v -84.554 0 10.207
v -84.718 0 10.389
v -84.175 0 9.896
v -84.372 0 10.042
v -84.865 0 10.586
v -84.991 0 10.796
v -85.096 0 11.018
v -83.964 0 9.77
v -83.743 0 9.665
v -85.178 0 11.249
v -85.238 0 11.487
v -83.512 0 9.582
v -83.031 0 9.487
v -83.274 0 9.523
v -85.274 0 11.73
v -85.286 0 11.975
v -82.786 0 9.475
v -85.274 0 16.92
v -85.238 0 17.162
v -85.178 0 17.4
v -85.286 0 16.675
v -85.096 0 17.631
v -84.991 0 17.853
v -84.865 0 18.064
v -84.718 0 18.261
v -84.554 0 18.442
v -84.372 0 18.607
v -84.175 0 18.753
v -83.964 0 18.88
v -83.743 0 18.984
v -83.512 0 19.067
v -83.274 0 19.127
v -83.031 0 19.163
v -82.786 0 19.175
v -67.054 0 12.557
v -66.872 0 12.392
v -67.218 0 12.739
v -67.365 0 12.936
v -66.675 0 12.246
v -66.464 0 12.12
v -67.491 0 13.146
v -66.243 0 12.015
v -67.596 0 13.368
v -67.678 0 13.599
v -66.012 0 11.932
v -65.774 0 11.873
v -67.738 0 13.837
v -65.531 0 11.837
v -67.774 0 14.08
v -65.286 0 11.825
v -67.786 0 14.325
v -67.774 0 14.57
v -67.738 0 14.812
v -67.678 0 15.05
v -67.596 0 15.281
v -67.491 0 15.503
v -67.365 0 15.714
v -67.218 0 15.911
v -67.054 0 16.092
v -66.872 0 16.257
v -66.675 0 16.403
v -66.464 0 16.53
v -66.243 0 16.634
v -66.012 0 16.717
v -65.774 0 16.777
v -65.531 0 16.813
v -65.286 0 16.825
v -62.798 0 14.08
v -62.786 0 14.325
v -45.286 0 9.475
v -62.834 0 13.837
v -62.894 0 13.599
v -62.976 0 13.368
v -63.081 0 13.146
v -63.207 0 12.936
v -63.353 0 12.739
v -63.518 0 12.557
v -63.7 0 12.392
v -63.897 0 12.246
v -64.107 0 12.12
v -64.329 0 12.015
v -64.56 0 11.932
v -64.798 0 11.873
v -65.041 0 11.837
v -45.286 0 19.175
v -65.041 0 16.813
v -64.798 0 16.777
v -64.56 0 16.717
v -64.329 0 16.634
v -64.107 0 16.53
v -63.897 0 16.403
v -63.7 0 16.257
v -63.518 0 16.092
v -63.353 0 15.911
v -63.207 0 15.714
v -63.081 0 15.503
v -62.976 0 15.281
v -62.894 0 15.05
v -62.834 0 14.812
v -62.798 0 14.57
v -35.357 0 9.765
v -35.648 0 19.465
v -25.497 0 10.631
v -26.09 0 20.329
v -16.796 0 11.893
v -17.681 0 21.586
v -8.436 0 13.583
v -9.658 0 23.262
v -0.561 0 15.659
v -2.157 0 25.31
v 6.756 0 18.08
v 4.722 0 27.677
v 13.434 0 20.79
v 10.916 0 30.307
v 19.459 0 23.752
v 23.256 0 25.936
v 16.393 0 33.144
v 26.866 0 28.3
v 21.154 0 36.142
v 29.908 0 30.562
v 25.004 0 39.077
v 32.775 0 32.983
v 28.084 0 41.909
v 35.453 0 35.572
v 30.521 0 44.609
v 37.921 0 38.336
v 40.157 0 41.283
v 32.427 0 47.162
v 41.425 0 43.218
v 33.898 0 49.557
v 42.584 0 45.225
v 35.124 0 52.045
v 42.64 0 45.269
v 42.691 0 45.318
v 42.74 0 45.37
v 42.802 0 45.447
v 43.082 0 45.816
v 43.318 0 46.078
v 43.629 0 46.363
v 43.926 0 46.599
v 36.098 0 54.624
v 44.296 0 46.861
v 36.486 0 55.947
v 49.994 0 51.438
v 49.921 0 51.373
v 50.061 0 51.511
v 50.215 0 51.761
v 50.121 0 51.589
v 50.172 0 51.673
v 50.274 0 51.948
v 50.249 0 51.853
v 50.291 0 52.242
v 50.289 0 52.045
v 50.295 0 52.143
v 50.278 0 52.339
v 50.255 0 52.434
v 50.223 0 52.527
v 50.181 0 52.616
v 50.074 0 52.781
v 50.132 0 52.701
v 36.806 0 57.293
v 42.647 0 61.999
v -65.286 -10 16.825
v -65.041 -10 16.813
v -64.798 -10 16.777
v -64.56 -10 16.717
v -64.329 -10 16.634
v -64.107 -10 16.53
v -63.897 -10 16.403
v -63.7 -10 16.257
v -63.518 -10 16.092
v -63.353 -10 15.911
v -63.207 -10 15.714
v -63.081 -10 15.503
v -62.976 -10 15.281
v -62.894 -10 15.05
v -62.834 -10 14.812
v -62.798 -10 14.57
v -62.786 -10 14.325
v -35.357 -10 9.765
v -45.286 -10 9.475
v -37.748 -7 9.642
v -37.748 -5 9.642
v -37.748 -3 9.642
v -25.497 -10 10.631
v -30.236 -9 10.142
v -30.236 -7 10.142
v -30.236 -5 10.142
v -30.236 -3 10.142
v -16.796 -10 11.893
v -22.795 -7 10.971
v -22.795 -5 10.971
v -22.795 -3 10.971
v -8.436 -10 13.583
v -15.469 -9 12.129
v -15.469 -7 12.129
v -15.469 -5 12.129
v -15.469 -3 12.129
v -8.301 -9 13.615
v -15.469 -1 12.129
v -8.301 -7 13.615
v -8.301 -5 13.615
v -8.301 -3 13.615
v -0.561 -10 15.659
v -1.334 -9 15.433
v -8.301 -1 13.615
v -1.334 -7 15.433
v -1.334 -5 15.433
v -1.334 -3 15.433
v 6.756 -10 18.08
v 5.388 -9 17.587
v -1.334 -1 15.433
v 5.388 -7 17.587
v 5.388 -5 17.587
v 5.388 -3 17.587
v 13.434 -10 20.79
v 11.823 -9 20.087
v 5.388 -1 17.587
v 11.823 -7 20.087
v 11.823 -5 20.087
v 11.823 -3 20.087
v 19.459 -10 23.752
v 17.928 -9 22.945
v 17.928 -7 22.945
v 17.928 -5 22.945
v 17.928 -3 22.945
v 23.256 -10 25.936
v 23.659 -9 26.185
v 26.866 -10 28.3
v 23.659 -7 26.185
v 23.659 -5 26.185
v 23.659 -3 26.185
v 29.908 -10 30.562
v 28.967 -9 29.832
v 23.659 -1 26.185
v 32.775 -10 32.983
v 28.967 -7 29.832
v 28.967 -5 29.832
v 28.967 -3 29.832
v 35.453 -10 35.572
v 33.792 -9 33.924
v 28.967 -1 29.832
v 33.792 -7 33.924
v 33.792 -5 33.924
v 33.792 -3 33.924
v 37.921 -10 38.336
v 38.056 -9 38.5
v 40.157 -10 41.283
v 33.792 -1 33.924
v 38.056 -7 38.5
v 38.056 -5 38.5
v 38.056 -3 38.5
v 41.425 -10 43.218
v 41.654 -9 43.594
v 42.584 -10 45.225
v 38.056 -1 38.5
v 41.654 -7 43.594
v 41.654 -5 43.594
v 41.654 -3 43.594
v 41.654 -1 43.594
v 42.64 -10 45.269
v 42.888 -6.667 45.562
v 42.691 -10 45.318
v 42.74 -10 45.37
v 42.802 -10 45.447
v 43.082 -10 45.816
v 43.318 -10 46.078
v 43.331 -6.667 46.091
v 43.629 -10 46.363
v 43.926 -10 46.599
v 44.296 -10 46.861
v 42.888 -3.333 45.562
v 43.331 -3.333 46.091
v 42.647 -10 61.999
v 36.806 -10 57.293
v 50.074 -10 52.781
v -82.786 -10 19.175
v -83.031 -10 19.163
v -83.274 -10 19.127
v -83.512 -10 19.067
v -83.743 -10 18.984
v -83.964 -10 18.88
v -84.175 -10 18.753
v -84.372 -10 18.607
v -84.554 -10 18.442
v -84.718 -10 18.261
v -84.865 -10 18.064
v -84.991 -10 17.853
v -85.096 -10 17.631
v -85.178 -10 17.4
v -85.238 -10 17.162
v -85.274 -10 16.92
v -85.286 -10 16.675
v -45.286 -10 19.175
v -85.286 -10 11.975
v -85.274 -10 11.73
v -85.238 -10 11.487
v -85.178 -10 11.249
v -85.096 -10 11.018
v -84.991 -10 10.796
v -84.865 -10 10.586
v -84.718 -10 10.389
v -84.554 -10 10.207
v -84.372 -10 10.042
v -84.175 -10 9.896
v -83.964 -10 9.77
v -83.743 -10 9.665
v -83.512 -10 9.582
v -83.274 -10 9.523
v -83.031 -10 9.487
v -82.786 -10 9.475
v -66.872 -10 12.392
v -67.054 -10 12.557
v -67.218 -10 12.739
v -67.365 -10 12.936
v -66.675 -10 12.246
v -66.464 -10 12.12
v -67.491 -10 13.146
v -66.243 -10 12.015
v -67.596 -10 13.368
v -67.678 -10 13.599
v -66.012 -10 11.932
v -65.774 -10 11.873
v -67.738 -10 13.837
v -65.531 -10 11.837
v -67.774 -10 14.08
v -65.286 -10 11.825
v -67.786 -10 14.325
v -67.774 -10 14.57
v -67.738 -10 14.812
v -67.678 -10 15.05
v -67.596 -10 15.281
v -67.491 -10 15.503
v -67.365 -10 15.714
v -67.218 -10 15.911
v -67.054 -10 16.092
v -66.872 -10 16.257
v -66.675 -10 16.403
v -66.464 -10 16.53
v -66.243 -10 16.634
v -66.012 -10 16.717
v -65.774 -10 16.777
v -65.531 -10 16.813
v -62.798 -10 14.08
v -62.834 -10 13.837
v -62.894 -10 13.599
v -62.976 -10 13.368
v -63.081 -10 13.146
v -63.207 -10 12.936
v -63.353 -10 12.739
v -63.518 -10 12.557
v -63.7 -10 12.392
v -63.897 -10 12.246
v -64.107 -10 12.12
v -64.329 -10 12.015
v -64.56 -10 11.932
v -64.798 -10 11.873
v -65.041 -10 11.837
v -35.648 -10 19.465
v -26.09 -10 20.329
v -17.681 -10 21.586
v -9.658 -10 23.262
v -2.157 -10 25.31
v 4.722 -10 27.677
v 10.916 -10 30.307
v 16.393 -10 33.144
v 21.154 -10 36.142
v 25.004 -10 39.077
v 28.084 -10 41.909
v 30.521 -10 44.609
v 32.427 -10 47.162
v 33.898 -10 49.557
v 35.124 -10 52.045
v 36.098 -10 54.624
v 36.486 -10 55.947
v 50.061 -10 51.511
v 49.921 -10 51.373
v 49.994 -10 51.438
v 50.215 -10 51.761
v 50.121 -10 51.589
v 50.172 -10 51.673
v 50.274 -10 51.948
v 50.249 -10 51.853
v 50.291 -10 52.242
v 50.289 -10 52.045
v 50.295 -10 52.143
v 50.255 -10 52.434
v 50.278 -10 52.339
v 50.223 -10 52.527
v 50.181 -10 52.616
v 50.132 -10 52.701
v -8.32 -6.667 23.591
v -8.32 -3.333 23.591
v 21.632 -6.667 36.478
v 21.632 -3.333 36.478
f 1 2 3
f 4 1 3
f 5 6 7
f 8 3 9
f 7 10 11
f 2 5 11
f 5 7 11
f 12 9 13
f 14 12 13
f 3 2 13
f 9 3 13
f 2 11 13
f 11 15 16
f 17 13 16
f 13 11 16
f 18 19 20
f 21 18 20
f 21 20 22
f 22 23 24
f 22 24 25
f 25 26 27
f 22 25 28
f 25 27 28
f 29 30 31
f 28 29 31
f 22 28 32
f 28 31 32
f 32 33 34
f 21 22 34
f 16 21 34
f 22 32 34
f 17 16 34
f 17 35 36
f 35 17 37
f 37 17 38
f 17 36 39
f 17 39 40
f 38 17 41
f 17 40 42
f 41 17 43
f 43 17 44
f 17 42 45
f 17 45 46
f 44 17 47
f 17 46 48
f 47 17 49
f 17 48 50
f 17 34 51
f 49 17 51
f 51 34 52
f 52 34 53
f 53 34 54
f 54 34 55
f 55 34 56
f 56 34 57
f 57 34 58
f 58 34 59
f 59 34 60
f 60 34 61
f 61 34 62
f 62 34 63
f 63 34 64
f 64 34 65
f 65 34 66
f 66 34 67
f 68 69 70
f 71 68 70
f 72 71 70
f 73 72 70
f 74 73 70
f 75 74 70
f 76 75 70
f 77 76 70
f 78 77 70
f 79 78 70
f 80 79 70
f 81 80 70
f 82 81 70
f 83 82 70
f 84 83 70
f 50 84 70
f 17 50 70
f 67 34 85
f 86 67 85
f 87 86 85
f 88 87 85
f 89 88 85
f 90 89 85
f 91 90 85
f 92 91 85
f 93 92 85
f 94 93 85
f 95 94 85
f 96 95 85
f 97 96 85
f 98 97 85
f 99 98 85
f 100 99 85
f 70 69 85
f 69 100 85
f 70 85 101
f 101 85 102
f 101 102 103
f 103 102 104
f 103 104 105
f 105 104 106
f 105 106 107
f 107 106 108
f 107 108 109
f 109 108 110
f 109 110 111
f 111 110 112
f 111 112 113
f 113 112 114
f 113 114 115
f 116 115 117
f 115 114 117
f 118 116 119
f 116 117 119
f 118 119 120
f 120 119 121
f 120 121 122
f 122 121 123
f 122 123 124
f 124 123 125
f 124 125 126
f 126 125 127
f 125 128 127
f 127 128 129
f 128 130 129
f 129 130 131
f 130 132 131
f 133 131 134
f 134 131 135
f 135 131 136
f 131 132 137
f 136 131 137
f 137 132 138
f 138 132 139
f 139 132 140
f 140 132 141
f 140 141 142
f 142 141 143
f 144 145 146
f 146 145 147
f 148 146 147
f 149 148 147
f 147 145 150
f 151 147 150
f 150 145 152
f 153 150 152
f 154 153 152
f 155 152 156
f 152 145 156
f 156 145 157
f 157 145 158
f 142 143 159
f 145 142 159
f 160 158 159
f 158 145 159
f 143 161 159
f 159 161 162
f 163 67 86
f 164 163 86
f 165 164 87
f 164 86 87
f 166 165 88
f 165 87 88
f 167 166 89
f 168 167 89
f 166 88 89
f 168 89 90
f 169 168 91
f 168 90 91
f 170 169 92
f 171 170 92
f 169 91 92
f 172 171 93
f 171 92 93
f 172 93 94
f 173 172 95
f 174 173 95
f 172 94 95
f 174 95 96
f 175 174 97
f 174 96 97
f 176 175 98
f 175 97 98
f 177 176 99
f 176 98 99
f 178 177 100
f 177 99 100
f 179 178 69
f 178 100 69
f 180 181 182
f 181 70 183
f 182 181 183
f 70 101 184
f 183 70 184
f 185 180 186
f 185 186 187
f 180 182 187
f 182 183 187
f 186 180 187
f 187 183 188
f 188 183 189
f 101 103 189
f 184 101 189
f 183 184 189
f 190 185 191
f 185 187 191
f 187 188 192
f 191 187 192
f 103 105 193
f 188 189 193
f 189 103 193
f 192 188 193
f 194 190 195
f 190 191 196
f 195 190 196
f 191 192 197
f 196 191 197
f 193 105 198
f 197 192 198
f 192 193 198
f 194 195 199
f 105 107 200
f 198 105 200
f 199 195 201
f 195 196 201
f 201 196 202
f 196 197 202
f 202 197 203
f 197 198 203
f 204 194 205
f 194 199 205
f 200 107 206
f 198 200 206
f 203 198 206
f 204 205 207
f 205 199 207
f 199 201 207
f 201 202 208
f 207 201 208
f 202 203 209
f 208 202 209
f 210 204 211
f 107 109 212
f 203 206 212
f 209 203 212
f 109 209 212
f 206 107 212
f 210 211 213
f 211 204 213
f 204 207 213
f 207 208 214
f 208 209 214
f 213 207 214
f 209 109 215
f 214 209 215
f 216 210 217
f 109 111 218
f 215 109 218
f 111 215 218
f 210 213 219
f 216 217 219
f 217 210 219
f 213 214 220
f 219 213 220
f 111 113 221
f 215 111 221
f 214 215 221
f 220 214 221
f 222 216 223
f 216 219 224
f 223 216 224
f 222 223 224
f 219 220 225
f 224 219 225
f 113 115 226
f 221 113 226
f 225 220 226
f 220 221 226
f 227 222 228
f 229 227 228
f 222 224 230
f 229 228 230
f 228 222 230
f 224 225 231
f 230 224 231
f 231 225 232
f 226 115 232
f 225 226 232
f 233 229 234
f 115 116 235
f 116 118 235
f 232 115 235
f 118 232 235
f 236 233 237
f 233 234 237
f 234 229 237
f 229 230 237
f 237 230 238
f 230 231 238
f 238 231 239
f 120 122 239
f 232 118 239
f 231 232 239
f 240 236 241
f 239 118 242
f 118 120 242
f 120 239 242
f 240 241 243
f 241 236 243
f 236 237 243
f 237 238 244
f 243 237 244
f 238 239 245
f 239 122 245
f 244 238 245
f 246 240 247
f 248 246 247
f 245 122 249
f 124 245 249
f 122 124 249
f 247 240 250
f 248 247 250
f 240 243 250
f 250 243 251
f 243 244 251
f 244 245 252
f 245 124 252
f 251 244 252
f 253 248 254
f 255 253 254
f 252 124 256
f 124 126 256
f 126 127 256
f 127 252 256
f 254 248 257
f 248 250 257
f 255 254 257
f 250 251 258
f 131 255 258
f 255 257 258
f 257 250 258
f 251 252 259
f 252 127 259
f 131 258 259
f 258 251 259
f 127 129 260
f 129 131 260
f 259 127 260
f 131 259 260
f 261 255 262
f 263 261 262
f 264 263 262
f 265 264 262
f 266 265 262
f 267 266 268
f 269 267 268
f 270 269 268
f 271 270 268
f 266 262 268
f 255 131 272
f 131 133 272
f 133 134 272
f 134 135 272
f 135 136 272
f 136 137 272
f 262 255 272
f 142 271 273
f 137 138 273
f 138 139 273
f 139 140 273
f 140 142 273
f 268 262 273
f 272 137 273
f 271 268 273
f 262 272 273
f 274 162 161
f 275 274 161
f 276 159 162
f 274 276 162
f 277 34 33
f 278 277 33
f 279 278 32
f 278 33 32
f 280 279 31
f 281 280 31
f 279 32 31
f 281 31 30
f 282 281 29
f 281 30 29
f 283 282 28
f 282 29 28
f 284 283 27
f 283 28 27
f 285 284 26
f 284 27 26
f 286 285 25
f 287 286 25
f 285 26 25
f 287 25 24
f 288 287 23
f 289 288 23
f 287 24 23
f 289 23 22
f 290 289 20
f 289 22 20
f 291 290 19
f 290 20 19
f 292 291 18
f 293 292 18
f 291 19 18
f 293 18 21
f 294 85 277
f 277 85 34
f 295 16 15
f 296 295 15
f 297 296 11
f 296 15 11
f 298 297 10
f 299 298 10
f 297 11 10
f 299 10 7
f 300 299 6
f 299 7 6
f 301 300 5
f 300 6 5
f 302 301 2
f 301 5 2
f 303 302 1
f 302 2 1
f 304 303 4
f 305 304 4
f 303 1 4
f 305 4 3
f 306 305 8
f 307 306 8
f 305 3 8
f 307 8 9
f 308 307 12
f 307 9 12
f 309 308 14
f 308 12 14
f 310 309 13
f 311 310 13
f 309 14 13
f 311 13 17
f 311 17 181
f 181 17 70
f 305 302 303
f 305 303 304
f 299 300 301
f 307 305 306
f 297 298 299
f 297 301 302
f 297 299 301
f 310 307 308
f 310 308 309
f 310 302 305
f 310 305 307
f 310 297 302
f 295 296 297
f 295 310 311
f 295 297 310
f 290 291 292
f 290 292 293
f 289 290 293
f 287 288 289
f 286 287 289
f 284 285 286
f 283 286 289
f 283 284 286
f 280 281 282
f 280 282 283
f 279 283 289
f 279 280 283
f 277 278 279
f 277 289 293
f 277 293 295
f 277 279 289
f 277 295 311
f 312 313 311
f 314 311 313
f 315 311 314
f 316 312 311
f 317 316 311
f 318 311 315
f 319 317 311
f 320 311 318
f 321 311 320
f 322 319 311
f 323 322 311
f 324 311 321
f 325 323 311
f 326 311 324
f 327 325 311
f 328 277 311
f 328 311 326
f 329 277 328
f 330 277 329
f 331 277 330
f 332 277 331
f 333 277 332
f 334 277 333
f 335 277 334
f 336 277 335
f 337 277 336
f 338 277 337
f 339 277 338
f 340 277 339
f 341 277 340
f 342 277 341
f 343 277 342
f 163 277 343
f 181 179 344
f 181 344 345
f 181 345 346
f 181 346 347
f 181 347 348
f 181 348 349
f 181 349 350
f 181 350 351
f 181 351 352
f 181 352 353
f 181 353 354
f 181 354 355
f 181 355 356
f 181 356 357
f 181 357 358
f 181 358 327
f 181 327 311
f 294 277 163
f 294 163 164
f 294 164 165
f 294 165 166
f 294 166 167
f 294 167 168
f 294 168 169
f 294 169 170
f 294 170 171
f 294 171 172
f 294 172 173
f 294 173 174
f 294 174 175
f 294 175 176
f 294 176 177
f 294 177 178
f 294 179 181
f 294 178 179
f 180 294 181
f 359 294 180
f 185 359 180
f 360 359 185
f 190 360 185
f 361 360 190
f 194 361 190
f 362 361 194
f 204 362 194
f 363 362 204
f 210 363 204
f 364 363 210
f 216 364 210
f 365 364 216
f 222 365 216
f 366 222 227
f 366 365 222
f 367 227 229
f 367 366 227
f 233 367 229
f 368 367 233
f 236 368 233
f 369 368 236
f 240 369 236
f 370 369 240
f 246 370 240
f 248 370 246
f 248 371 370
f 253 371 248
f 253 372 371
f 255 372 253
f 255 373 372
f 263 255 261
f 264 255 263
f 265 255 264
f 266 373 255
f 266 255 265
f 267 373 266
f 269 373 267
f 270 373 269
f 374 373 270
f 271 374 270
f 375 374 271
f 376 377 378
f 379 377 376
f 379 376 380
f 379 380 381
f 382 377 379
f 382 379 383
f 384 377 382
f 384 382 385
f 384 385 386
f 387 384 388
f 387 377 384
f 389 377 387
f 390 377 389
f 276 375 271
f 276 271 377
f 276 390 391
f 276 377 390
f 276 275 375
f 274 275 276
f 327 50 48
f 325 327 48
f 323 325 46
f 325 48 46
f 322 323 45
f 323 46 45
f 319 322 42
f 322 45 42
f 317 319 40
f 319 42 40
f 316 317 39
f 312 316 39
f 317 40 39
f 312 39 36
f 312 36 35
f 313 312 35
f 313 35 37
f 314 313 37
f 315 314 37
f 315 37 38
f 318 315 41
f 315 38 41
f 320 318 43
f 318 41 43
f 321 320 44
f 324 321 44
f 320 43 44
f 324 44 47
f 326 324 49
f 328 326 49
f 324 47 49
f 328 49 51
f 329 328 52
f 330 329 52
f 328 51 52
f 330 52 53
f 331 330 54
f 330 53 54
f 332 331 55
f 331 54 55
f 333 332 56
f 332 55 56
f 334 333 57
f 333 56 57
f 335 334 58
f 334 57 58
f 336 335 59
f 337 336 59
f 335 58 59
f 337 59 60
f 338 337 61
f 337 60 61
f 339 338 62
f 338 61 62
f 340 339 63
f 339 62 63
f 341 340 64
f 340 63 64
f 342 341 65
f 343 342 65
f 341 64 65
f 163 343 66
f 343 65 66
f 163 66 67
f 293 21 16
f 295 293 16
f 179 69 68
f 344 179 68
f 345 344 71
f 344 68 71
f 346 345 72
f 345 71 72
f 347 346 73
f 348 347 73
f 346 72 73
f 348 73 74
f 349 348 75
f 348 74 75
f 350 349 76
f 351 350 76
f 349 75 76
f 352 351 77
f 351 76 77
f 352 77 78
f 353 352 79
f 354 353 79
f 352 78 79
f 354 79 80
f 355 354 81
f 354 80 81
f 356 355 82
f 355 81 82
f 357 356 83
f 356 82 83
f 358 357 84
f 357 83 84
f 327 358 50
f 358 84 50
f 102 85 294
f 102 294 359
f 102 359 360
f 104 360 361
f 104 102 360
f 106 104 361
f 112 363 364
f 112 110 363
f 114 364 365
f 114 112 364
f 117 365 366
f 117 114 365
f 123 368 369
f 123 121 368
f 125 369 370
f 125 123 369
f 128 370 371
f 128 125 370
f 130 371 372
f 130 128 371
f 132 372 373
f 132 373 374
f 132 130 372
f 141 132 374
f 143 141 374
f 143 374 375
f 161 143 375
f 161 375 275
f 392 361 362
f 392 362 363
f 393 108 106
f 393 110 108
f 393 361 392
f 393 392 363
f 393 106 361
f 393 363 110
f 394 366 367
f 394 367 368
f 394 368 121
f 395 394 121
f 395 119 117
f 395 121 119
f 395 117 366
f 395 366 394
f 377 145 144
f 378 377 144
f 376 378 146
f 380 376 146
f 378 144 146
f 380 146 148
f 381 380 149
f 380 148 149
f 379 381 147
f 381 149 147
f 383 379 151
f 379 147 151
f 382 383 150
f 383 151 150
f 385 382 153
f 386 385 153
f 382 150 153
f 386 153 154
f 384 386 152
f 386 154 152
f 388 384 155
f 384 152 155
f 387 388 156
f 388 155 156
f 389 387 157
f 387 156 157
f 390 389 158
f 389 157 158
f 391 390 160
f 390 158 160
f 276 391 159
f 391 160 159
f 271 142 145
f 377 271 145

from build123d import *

# Parameters (mm, degrees)
F1_DEPTH = 10


# Not quite as in the source:
# - ends of sketch curves that miss each other by under 0.0002 mm in the source are joined
# - the dataset's text gives a spline's control points without its knots; the knots are read off the source's solid


with BuildPart() as f1:
    # F0 (on Front) → F1 (new body)
    with BuildSketch(Plane.XZ):
        with BuildLine():
            Line((-65.2858525045, 19.1747198819), (-82.7858525045, 19.1747198819))
            ThreePointArc((-82.7858525045, 19.1747198819), (-84.5536194575, 18.4424868349), (-85.2858525045, 16.6747198819))
            Line((-85.2858525045, 16.6747198819), (-85.2858525045, 11.9747207331))
            ThreePointArc((-85.2858525045, 11.9747207331), (-84.5536194575, 10.2069537801), (-82.7858525045, 9.4747207331))
            Line((-82.7858525045, 9.4747207331), (-65.2858525045, 9.4747207331))
            Line((-65.2858525045, 9.4747207331), (-65.2858525045, 11.8247203075))
            ThreePointArc((-65.2858525045, 11.8247203075), (-67.7858525045, 14.3247203075), (-65.2858525045, 16.8247203075))
            Line((-65.2858525045, 16.8247203075), (-65.2858525045, 19.1747198819))
        make_face()
        with BuildLine():
            Line((-45.2858542078, 19.1747198819), (-65.2858525045, 19.1747198819))
            Line((-65.2858525045, 19.1747198819), (-65.2858525045, 16.8247203075))
            ThreePointArc((-65.2858525045, 16.8247203075), (-63.5180855515, 16.0924872605), (-62.7858525045, 14.3247203075))
            ThreePointArc((-62.7858525045, 14.3247203075), (-63.5180855515, 12.5569533545), (-65.2858525045, 11.8247203075))
            Line((-65.2858525045, 11.8247203075), (-65.2858525045, 9.4747207331))
            Line((-65.2858525045, 9.4747207331), (-45.2858525045, 9.4747207331))
            Line((-45.2858525045, 9.4747207331), (-45.2858542078, 19.1747198819))
        make_face()
        with BuildLine():
            add(Edge.make_bspline(
                [(-45.2858542078, 19.1747198819), (-7.4020708747, 19.1747265342), (31.6102094948, 32.6948724687), (36.8064381182, 57.2929121554)],
                knots=[0, 0, 0, 0, 90.5104471403, 90.5104471403, 90.5104471403, 90.5104471403], degree=3))
            Line((-45.2858542078, 19.1747198819), (-45.2858525045, 9.4747207331))
            add(Edge.make_bspline(
                [(-45.2858525045, 9.4747207331), (-40.2618978901, 9.4747216153), (-30.1894784684, 9.9223917761), (-15.362918013, 11.9100905112), (-1.1709415961, 15.2094571968), (12.0418148644, 19.8491680066), (21.9570020274, 24.9039048155), (29.047465051, 29.7583646646), (33.8850587667, 33.8431124408), (38.1663250739, 38.413322434), (40.9420261226, 42.3174471625), (42.2861221075, 44.6734195955), (42.5837097689, 45.2249895308)],
                knots=[0, 0, 0, 0, 0.125, 0.25, 0.375, 0.5, 0.625, 0.6875, 0.75, 0.8125, 0.875, 0.8937572345, 0.8937572345, 0.8937572345, 0.8937572345], degree=3))
            add(Edge.make_bspline(
                [(42.5837097689, 45.2249895308), (42.9712246909, 45.9432369861), (43.3372375793, 46.6745796576), (43.6802036603, 47.4185139687)],
                knots=[0.8937572345, 0.8937572345, 0.8937572345, 0.8937572345, 0.9181826701, 0.9181826701, 0.9181826701, 0.9181826701], degree=3))
            Line((43.6802036603, 47.4185139687), (44.295853648, 46.8606554446))
            Line((44.295853648, 46.8606554446), (49.9209338751, 51.373229087))
            ThreePointArc((49.9209338751, 51.373229087), (50.2893303324, 52.0452304101), (50.0738615656, 52.7806724123))
            Line((50.0738615656, 52.7806724123), (42.6465372943, 61.9985727481))
            Line((42.6465372943, 61.9985727481), (36.8064381182, 57.2929121554))
        make_face()
        with BuildLine():
            add(Edge.make_bspline(
                [(42.5837097689, 45.2249895308), (42.9712246909, 45.9432369861), (43.3372375793, 46.6745796576), (43.6802036603, 47.4185139687)],
                knots=[0.8937572345, 0.8937572345, 0.8937572345, 0.8937572345, 0.9181826701, 0.9181826701, 0.9181826701, 0.9181826701], degree=3))
            add(Edge.make_bspline(
                [(42.5837097689, 45.2249895308), (42.9444412623, 45.4831122336), (42.9444412623, 45.9540075538), (44.295853648, 46.8606554446)],
                knots=[0, 0, 0, 0, 2.3678540998, 2.3678540998, 2.3678540998, 2.3678540998], degree=3))
            Line((44.295853648, 46.8606554446), (43.6802036603, 47.4185139687))
        make_face()
    extrude(amount=F1_DEPTH)


solid = f1.part
